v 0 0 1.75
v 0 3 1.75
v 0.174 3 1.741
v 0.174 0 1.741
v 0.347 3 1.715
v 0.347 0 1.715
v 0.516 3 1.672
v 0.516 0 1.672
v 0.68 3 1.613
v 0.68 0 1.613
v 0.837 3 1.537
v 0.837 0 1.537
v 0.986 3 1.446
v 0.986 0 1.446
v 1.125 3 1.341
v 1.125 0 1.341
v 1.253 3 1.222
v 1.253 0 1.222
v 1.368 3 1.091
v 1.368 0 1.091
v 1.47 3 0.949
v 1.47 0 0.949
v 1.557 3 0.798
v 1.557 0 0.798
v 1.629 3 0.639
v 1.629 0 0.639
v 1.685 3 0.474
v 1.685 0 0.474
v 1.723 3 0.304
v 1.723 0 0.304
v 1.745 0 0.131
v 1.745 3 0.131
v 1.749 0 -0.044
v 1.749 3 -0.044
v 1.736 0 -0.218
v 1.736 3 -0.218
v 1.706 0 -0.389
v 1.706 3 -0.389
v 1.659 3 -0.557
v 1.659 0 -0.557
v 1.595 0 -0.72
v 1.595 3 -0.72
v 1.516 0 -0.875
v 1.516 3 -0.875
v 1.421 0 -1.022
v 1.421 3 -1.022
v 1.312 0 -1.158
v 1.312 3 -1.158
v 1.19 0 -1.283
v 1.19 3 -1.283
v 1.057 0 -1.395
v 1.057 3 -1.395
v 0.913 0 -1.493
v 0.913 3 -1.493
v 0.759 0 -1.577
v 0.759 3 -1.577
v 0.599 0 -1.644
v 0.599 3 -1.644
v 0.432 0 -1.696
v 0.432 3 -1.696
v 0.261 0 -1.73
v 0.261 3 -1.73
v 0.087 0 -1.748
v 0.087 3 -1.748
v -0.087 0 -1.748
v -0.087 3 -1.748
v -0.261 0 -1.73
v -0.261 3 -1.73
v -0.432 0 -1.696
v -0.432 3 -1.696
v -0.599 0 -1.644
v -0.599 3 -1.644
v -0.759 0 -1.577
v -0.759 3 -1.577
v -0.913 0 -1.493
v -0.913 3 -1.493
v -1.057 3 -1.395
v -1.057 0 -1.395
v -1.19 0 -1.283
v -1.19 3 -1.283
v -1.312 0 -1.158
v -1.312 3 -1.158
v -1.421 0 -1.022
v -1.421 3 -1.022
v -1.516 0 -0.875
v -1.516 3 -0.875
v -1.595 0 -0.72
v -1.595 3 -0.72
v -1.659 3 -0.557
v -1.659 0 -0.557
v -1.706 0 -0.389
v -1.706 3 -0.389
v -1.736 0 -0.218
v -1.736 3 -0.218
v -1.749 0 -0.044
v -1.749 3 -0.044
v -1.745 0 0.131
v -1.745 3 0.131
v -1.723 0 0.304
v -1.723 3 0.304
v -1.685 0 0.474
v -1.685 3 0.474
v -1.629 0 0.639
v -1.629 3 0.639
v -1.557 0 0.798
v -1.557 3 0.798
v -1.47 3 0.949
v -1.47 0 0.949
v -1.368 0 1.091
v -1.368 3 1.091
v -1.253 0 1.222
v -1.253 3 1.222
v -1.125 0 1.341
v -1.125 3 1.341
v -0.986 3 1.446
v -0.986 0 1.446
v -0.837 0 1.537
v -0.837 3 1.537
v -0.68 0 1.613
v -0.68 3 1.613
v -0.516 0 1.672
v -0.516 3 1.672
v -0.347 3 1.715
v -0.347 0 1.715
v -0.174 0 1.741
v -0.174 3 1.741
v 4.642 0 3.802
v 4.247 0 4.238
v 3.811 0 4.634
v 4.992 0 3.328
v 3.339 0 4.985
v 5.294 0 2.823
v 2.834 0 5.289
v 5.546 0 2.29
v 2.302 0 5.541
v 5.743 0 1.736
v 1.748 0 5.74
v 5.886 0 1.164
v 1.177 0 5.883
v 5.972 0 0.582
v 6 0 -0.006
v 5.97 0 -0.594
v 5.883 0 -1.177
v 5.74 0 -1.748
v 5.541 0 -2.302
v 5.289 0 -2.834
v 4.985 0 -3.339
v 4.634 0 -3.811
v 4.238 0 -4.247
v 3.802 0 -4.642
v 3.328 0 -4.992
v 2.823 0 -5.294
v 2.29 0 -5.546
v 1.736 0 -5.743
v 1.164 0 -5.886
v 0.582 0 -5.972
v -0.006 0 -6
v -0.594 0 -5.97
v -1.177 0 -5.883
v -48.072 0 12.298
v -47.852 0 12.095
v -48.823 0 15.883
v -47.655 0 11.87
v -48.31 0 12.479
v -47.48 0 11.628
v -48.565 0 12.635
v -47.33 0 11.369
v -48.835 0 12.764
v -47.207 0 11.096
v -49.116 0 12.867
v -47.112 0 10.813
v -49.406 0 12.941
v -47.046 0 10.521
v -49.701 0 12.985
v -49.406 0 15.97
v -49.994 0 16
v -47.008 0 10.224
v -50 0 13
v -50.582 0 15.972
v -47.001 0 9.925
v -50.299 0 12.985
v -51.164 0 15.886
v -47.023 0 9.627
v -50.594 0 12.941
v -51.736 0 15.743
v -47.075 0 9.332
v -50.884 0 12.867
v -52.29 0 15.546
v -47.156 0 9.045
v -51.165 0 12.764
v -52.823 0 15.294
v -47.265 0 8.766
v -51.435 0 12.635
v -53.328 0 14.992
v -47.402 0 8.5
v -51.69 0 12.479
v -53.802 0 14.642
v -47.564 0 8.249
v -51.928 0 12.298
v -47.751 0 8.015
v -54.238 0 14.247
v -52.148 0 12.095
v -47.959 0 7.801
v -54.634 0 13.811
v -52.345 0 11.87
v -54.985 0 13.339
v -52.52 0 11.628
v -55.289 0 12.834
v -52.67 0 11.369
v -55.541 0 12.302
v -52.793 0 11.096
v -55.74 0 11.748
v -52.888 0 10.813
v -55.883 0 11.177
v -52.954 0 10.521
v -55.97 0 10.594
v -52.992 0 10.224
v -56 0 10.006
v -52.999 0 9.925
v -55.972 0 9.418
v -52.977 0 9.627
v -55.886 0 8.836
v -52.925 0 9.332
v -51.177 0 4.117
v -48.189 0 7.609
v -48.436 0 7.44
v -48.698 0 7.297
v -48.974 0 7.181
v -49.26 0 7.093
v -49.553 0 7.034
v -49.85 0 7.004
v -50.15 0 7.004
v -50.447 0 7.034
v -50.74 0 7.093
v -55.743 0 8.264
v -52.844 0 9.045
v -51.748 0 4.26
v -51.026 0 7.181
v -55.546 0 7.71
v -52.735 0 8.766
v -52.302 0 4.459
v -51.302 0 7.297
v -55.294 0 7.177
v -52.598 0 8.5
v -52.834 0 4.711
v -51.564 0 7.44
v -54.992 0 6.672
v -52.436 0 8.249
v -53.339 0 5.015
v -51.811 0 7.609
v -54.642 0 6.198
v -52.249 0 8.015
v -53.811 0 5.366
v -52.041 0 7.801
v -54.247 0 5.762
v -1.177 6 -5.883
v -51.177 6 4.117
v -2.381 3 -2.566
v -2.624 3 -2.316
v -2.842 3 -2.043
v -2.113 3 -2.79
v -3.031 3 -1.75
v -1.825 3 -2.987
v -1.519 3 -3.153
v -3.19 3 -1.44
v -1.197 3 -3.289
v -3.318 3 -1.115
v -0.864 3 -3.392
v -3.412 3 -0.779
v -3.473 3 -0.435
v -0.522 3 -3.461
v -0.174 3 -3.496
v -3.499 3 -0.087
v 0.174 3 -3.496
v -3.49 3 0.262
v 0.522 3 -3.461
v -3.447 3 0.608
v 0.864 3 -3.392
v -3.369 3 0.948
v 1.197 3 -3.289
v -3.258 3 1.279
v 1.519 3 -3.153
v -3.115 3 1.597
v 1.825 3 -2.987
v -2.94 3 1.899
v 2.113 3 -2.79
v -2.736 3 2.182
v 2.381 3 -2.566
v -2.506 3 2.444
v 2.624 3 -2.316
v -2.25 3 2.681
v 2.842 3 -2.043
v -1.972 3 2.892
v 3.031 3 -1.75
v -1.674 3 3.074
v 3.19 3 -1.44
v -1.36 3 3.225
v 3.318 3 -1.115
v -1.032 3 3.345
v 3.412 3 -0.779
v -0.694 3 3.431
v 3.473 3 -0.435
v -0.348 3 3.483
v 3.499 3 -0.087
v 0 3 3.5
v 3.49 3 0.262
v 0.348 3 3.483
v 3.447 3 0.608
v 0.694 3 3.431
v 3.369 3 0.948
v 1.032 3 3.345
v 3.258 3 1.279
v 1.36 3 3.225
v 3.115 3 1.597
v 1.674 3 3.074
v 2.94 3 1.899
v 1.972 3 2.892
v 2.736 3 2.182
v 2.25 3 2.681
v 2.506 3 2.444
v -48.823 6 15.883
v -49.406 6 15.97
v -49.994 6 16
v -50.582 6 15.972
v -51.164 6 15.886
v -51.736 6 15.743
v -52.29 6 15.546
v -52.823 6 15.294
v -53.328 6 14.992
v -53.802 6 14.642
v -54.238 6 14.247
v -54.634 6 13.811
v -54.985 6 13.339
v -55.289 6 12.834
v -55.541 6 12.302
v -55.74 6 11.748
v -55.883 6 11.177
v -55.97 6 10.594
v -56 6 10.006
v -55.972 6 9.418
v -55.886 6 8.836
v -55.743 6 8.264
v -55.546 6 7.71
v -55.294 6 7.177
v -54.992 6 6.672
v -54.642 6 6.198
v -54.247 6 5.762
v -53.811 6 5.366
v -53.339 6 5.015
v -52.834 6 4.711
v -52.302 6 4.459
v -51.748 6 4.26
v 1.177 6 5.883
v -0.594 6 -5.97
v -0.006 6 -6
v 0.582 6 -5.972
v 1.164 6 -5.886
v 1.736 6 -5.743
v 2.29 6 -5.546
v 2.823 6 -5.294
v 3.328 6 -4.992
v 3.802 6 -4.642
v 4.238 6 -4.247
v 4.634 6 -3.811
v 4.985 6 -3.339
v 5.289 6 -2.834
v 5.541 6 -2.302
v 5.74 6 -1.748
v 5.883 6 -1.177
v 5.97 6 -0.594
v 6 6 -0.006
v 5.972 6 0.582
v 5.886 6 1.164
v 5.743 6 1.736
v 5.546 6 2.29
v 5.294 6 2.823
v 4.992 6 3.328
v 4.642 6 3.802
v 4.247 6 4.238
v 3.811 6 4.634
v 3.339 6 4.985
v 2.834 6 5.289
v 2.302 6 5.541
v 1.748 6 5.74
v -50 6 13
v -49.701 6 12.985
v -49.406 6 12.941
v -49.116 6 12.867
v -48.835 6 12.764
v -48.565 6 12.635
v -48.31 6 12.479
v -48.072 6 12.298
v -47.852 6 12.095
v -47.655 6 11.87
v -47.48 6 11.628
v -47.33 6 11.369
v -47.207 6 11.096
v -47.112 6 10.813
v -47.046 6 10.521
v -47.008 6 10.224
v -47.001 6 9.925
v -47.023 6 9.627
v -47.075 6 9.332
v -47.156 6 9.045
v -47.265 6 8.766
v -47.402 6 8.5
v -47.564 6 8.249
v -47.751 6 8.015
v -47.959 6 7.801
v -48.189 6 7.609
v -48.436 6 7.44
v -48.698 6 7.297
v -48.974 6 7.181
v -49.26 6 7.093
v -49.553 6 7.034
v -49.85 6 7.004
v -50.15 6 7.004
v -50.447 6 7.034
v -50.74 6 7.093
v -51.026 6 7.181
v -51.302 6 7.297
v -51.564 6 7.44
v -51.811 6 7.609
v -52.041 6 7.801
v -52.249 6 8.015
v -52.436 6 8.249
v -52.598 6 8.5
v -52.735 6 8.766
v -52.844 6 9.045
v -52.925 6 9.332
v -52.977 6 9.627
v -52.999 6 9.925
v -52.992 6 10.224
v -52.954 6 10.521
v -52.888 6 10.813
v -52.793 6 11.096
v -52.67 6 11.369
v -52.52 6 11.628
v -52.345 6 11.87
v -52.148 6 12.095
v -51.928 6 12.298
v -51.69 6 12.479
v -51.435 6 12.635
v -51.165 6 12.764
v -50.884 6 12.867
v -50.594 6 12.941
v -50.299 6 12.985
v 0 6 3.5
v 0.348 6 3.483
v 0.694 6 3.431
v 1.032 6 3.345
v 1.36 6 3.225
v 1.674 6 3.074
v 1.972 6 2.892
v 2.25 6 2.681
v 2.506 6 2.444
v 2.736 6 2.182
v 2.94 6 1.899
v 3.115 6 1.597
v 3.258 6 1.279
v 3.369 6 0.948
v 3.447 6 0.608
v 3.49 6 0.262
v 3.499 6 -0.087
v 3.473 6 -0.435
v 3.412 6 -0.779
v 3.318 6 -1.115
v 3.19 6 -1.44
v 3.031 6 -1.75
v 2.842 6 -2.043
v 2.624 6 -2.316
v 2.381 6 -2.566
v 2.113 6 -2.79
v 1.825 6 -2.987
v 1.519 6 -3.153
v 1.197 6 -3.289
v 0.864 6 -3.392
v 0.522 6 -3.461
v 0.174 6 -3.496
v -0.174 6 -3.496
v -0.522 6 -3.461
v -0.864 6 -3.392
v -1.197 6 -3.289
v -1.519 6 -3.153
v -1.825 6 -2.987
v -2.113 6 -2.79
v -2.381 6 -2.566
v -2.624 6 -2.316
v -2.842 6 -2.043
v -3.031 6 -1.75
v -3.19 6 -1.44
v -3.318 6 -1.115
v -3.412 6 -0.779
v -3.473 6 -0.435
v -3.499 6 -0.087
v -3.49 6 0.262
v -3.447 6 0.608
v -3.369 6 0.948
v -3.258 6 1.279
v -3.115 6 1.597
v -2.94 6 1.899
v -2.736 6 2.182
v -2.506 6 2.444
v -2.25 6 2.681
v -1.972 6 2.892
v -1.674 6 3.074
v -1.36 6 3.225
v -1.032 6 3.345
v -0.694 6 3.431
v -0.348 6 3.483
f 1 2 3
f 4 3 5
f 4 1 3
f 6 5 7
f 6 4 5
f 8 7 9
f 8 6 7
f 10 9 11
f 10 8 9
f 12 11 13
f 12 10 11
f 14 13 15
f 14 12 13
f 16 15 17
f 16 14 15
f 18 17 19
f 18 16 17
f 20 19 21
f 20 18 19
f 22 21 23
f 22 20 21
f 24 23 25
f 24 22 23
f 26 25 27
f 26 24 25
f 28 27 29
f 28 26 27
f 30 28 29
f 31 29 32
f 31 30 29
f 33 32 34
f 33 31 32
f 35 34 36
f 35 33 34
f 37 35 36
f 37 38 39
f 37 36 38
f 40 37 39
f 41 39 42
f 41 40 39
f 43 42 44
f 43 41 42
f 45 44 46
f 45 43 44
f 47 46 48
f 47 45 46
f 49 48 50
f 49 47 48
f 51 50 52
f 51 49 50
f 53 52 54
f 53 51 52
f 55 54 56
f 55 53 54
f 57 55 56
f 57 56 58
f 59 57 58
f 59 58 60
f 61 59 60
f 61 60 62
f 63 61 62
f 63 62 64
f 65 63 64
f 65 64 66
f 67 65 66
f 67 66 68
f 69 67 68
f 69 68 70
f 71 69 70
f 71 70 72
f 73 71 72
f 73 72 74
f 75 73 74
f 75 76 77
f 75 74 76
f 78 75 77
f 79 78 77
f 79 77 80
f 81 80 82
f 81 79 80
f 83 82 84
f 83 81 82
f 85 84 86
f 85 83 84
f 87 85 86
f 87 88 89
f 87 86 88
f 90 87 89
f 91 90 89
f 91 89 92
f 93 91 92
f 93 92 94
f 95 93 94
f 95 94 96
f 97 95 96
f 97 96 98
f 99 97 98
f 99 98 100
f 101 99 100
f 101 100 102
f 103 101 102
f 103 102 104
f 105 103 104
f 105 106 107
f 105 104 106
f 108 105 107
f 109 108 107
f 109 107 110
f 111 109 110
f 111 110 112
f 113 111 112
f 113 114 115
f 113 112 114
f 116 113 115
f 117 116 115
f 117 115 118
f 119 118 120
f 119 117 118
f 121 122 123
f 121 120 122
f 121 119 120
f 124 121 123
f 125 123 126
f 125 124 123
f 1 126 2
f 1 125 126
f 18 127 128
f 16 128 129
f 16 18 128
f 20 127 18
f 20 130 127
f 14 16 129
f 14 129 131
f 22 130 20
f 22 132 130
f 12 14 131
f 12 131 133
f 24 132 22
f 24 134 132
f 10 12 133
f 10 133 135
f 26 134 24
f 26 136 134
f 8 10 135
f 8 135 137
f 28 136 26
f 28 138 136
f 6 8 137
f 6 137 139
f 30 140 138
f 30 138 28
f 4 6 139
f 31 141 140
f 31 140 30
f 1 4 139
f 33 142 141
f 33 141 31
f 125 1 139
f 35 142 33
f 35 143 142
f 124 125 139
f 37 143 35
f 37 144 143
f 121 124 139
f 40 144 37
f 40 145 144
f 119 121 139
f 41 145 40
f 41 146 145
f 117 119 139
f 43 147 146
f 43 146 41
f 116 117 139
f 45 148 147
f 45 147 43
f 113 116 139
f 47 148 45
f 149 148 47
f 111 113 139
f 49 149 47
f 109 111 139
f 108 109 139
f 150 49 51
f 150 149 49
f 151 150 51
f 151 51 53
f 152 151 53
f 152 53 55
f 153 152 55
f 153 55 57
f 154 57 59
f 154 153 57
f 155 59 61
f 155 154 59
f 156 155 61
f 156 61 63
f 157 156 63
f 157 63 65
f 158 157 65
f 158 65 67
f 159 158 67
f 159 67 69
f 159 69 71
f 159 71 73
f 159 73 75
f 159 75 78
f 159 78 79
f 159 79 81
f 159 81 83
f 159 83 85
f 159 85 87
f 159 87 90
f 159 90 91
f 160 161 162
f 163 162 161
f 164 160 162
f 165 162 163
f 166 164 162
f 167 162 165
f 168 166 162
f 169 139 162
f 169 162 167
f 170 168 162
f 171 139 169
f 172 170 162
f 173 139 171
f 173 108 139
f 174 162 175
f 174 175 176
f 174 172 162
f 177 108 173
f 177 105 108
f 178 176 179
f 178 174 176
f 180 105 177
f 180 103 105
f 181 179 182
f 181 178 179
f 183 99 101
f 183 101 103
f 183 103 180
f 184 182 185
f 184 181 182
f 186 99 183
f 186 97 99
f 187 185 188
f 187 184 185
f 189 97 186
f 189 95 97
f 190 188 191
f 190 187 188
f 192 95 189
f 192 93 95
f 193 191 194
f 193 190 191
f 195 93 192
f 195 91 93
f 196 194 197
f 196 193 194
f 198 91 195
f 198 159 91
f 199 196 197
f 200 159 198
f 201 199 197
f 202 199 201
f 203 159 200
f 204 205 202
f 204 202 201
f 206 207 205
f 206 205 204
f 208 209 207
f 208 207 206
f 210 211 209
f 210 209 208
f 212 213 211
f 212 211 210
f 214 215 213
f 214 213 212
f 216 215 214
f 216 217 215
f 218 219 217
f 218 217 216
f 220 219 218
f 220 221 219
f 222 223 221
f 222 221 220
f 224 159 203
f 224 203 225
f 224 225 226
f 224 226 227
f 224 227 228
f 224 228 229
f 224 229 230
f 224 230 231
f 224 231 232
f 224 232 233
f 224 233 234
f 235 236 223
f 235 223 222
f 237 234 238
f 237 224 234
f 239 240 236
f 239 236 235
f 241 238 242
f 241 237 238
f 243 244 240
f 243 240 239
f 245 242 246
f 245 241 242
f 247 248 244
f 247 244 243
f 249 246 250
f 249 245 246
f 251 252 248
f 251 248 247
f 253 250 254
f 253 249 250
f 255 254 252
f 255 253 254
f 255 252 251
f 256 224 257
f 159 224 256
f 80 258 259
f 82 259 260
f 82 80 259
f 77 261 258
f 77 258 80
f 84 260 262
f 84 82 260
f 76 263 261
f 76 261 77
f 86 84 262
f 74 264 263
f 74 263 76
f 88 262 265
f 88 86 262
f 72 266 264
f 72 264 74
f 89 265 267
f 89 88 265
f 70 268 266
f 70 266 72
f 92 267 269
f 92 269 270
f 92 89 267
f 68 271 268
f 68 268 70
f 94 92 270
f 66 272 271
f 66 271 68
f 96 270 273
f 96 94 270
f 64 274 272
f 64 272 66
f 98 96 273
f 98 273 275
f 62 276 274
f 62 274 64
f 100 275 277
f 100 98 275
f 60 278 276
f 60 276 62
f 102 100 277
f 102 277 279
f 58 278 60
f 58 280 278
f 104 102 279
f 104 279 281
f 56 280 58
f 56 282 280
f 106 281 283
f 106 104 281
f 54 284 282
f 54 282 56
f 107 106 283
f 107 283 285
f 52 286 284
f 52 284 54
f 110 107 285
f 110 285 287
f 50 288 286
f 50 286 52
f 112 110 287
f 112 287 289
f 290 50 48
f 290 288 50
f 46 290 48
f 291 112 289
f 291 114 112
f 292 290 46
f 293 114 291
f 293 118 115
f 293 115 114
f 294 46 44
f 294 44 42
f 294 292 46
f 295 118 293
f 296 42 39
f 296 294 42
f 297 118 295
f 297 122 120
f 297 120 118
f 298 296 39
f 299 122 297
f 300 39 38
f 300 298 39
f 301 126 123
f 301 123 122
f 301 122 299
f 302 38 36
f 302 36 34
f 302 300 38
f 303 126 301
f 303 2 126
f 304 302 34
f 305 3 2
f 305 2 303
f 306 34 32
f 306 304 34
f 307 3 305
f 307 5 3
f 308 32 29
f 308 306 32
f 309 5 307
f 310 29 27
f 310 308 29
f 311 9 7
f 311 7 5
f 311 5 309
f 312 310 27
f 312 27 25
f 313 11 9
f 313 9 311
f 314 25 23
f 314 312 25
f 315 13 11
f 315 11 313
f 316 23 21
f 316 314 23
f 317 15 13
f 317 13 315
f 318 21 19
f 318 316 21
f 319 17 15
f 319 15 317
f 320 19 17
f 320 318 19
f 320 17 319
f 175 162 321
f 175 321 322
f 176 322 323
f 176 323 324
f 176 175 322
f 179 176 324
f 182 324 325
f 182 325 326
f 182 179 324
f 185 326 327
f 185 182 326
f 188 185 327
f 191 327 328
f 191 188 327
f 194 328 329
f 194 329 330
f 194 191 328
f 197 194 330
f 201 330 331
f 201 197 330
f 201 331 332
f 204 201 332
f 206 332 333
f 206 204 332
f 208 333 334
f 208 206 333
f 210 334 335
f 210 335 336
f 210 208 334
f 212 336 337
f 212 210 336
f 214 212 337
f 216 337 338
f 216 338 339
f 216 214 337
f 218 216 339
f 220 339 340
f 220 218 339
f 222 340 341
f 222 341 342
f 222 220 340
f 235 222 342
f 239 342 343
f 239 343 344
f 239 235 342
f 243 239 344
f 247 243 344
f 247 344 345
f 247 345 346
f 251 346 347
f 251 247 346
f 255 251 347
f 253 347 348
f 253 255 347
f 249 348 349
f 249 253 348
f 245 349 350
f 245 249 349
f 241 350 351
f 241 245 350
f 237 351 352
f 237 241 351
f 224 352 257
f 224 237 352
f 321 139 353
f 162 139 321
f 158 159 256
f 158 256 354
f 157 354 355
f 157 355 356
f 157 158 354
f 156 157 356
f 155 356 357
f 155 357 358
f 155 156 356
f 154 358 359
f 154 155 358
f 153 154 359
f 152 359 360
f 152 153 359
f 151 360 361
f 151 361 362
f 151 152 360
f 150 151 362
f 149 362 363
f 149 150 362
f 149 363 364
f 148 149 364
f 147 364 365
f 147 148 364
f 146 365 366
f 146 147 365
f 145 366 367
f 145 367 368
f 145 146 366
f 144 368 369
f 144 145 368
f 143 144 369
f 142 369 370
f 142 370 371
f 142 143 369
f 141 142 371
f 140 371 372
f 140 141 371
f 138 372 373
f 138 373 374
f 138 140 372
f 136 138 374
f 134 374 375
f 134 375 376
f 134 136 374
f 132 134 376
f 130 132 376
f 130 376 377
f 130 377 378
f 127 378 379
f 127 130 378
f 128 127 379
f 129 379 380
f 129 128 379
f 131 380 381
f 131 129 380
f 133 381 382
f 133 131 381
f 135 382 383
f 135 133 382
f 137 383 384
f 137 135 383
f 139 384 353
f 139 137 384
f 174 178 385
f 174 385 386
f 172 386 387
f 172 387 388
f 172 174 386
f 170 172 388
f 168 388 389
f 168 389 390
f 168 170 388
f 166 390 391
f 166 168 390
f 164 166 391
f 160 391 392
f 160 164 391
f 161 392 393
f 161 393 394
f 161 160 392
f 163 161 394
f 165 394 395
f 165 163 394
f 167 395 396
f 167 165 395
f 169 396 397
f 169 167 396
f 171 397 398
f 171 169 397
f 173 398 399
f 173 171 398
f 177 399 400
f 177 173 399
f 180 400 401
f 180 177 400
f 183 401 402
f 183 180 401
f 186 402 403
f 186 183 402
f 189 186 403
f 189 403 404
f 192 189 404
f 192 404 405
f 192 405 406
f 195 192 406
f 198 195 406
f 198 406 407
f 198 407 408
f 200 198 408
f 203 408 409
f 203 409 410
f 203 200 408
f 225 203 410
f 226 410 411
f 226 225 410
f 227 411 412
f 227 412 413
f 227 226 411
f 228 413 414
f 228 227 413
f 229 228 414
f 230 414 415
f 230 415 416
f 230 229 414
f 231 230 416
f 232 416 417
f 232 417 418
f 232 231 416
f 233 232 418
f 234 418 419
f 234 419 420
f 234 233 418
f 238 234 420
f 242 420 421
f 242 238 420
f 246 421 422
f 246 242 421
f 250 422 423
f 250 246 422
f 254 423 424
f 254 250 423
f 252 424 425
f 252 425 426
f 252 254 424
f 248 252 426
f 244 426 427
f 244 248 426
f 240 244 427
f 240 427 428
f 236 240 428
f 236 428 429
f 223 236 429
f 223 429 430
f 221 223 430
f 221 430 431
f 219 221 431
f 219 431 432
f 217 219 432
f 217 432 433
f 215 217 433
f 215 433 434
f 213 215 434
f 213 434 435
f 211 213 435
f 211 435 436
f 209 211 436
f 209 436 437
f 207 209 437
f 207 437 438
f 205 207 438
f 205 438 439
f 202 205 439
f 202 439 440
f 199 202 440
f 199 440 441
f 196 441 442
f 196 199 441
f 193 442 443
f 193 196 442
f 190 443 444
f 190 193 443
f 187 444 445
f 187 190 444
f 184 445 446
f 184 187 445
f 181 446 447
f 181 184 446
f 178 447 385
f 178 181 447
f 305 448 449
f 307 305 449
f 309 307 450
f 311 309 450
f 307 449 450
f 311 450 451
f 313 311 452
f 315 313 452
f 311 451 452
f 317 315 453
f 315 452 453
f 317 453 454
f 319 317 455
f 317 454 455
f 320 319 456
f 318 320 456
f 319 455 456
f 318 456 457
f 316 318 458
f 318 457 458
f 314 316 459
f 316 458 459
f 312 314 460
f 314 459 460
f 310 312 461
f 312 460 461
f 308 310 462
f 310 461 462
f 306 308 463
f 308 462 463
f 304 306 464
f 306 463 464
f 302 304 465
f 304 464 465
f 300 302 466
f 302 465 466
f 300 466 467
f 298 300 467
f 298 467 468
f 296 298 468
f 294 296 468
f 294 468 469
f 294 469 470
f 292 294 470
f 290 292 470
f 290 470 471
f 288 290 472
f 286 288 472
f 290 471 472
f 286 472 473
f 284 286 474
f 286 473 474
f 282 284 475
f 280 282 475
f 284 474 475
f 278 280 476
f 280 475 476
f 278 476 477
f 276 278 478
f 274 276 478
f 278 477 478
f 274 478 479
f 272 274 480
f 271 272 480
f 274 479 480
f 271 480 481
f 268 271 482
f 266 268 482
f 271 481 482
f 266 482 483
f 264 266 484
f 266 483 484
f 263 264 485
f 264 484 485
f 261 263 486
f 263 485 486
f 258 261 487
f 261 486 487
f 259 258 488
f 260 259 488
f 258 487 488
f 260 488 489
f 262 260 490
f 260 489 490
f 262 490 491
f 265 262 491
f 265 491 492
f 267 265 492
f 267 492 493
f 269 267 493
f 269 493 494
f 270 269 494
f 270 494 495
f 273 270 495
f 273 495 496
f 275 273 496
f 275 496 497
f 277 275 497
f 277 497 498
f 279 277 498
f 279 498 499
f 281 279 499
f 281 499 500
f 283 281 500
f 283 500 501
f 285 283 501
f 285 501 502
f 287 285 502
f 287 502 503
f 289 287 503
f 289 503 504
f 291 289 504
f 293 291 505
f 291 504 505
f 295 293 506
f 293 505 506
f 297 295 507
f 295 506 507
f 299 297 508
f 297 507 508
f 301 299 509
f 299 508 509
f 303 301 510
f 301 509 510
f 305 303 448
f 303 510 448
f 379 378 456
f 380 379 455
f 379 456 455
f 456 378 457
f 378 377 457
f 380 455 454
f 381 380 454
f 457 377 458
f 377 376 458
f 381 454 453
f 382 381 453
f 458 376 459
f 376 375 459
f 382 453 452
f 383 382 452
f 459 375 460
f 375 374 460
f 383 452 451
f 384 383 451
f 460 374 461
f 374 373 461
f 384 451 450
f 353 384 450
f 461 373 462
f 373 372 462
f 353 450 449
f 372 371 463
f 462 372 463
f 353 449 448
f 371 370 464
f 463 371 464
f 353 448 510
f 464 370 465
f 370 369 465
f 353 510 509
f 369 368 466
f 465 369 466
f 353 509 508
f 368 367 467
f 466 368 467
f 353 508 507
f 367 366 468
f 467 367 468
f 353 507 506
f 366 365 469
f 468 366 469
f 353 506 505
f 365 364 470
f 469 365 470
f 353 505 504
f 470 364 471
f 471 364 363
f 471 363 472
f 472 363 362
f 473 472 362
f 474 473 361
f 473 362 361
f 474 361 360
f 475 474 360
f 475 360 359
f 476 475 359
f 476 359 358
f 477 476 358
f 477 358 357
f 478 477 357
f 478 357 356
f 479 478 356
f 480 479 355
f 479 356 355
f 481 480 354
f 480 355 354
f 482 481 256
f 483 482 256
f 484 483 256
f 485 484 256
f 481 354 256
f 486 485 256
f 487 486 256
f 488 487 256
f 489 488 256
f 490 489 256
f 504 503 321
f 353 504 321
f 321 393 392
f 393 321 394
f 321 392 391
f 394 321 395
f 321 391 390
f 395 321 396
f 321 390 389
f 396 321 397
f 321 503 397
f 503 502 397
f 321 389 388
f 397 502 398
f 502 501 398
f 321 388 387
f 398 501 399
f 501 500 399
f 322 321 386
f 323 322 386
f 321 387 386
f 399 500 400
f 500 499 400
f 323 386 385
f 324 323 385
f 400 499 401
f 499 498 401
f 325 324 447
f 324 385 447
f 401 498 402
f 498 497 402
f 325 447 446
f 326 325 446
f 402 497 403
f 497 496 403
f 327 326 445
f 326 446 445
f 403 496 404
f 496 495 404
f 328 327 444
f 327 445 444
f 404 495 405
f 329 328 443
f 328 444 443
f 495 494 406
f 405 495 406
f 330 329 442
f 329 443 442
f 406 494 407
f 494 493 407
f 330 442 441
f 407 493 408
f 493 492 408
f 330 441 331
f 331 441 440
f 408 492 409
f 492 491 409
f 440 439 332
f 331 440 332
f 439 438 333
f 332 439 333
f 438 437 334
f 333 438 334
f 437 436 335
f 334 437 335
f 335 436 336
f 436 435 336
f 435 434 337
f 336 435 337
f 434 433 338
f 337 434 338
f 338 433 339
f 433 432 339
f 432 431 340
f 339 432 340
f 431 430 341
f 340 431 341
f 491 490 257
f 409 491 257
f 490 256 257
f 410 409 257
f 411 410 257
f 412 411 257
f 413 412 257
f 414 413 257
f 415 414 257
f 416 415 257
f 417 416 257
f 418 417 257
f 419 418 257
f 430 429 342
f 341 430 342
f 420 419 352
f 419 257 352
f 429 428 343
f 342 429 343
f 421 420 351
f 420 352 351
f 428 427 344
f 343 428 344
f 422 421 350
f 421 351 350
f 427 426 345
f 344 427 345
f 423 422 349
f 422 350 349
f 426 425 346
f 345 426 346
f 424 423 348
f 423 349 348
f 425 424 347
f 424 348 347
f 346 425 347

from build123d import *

# Parameters (mm, degrees)
SKETCH1_R           = 1.75
SKETCH1_R_2         = 3
BOSS_EXTRUDE1_DEPTH = 6
SKETCH2_R           = 3.5
CUT_EXTRUDE1_DEPTH  = 3


with BuildPart() as part:
    # Sketch1 → Boss-Extrude1 (new body)
    with BuildSketch(Plane(origin=(0, 0, 0), x_dir=(1, 0, 0), z_dir=(0, 1, 0))):
        with BuildLine():
            Line((1.176696811, -5.883484054), (-48.823303189, -15.883484054))
            ThreePointArc((-48.823303189, -15.883484054), (-55.883484054, -11.176696811), (-51.176696811, -4.116515946))
            Line((-51.176696811, -4.116515946), (-1.176696811, 5.883484054))
            ThreePointArc((-1.176696811, 5.883484054), (5.883484054, 1.176696811), (1.176696811, -5.883484054))
        make_face()
        with Locations(Location((0, 0, 0), (0, 0, 270))):
            Circle(SKETCH1_R, mode=Mode.SUBTRACT)
        with Locations(Location((-50, -10, 0), (0, 0, 270))):
            Circle(SKETCH1_R_2, mode=Mode.SUBTRACT)
    extrude(amount=BOSS_EXTRUDE1_DEPTH)

    # Sketch2 → Cut-Extrude1 (cut)
    with BuildSketch(Plane(origin=(0, 6, 0), x_dir=(1, 0, 0), z_dir=(0, 1, 0))):
        with Locations(Location((0, 0, 0), (0, 0, 270))):
            Circle(SKETCH2_R)
    extrude(amount=-CUT_EXTRUDE1_DEPTH, mode=Mode.SUBTRACT)


solid = part.part
